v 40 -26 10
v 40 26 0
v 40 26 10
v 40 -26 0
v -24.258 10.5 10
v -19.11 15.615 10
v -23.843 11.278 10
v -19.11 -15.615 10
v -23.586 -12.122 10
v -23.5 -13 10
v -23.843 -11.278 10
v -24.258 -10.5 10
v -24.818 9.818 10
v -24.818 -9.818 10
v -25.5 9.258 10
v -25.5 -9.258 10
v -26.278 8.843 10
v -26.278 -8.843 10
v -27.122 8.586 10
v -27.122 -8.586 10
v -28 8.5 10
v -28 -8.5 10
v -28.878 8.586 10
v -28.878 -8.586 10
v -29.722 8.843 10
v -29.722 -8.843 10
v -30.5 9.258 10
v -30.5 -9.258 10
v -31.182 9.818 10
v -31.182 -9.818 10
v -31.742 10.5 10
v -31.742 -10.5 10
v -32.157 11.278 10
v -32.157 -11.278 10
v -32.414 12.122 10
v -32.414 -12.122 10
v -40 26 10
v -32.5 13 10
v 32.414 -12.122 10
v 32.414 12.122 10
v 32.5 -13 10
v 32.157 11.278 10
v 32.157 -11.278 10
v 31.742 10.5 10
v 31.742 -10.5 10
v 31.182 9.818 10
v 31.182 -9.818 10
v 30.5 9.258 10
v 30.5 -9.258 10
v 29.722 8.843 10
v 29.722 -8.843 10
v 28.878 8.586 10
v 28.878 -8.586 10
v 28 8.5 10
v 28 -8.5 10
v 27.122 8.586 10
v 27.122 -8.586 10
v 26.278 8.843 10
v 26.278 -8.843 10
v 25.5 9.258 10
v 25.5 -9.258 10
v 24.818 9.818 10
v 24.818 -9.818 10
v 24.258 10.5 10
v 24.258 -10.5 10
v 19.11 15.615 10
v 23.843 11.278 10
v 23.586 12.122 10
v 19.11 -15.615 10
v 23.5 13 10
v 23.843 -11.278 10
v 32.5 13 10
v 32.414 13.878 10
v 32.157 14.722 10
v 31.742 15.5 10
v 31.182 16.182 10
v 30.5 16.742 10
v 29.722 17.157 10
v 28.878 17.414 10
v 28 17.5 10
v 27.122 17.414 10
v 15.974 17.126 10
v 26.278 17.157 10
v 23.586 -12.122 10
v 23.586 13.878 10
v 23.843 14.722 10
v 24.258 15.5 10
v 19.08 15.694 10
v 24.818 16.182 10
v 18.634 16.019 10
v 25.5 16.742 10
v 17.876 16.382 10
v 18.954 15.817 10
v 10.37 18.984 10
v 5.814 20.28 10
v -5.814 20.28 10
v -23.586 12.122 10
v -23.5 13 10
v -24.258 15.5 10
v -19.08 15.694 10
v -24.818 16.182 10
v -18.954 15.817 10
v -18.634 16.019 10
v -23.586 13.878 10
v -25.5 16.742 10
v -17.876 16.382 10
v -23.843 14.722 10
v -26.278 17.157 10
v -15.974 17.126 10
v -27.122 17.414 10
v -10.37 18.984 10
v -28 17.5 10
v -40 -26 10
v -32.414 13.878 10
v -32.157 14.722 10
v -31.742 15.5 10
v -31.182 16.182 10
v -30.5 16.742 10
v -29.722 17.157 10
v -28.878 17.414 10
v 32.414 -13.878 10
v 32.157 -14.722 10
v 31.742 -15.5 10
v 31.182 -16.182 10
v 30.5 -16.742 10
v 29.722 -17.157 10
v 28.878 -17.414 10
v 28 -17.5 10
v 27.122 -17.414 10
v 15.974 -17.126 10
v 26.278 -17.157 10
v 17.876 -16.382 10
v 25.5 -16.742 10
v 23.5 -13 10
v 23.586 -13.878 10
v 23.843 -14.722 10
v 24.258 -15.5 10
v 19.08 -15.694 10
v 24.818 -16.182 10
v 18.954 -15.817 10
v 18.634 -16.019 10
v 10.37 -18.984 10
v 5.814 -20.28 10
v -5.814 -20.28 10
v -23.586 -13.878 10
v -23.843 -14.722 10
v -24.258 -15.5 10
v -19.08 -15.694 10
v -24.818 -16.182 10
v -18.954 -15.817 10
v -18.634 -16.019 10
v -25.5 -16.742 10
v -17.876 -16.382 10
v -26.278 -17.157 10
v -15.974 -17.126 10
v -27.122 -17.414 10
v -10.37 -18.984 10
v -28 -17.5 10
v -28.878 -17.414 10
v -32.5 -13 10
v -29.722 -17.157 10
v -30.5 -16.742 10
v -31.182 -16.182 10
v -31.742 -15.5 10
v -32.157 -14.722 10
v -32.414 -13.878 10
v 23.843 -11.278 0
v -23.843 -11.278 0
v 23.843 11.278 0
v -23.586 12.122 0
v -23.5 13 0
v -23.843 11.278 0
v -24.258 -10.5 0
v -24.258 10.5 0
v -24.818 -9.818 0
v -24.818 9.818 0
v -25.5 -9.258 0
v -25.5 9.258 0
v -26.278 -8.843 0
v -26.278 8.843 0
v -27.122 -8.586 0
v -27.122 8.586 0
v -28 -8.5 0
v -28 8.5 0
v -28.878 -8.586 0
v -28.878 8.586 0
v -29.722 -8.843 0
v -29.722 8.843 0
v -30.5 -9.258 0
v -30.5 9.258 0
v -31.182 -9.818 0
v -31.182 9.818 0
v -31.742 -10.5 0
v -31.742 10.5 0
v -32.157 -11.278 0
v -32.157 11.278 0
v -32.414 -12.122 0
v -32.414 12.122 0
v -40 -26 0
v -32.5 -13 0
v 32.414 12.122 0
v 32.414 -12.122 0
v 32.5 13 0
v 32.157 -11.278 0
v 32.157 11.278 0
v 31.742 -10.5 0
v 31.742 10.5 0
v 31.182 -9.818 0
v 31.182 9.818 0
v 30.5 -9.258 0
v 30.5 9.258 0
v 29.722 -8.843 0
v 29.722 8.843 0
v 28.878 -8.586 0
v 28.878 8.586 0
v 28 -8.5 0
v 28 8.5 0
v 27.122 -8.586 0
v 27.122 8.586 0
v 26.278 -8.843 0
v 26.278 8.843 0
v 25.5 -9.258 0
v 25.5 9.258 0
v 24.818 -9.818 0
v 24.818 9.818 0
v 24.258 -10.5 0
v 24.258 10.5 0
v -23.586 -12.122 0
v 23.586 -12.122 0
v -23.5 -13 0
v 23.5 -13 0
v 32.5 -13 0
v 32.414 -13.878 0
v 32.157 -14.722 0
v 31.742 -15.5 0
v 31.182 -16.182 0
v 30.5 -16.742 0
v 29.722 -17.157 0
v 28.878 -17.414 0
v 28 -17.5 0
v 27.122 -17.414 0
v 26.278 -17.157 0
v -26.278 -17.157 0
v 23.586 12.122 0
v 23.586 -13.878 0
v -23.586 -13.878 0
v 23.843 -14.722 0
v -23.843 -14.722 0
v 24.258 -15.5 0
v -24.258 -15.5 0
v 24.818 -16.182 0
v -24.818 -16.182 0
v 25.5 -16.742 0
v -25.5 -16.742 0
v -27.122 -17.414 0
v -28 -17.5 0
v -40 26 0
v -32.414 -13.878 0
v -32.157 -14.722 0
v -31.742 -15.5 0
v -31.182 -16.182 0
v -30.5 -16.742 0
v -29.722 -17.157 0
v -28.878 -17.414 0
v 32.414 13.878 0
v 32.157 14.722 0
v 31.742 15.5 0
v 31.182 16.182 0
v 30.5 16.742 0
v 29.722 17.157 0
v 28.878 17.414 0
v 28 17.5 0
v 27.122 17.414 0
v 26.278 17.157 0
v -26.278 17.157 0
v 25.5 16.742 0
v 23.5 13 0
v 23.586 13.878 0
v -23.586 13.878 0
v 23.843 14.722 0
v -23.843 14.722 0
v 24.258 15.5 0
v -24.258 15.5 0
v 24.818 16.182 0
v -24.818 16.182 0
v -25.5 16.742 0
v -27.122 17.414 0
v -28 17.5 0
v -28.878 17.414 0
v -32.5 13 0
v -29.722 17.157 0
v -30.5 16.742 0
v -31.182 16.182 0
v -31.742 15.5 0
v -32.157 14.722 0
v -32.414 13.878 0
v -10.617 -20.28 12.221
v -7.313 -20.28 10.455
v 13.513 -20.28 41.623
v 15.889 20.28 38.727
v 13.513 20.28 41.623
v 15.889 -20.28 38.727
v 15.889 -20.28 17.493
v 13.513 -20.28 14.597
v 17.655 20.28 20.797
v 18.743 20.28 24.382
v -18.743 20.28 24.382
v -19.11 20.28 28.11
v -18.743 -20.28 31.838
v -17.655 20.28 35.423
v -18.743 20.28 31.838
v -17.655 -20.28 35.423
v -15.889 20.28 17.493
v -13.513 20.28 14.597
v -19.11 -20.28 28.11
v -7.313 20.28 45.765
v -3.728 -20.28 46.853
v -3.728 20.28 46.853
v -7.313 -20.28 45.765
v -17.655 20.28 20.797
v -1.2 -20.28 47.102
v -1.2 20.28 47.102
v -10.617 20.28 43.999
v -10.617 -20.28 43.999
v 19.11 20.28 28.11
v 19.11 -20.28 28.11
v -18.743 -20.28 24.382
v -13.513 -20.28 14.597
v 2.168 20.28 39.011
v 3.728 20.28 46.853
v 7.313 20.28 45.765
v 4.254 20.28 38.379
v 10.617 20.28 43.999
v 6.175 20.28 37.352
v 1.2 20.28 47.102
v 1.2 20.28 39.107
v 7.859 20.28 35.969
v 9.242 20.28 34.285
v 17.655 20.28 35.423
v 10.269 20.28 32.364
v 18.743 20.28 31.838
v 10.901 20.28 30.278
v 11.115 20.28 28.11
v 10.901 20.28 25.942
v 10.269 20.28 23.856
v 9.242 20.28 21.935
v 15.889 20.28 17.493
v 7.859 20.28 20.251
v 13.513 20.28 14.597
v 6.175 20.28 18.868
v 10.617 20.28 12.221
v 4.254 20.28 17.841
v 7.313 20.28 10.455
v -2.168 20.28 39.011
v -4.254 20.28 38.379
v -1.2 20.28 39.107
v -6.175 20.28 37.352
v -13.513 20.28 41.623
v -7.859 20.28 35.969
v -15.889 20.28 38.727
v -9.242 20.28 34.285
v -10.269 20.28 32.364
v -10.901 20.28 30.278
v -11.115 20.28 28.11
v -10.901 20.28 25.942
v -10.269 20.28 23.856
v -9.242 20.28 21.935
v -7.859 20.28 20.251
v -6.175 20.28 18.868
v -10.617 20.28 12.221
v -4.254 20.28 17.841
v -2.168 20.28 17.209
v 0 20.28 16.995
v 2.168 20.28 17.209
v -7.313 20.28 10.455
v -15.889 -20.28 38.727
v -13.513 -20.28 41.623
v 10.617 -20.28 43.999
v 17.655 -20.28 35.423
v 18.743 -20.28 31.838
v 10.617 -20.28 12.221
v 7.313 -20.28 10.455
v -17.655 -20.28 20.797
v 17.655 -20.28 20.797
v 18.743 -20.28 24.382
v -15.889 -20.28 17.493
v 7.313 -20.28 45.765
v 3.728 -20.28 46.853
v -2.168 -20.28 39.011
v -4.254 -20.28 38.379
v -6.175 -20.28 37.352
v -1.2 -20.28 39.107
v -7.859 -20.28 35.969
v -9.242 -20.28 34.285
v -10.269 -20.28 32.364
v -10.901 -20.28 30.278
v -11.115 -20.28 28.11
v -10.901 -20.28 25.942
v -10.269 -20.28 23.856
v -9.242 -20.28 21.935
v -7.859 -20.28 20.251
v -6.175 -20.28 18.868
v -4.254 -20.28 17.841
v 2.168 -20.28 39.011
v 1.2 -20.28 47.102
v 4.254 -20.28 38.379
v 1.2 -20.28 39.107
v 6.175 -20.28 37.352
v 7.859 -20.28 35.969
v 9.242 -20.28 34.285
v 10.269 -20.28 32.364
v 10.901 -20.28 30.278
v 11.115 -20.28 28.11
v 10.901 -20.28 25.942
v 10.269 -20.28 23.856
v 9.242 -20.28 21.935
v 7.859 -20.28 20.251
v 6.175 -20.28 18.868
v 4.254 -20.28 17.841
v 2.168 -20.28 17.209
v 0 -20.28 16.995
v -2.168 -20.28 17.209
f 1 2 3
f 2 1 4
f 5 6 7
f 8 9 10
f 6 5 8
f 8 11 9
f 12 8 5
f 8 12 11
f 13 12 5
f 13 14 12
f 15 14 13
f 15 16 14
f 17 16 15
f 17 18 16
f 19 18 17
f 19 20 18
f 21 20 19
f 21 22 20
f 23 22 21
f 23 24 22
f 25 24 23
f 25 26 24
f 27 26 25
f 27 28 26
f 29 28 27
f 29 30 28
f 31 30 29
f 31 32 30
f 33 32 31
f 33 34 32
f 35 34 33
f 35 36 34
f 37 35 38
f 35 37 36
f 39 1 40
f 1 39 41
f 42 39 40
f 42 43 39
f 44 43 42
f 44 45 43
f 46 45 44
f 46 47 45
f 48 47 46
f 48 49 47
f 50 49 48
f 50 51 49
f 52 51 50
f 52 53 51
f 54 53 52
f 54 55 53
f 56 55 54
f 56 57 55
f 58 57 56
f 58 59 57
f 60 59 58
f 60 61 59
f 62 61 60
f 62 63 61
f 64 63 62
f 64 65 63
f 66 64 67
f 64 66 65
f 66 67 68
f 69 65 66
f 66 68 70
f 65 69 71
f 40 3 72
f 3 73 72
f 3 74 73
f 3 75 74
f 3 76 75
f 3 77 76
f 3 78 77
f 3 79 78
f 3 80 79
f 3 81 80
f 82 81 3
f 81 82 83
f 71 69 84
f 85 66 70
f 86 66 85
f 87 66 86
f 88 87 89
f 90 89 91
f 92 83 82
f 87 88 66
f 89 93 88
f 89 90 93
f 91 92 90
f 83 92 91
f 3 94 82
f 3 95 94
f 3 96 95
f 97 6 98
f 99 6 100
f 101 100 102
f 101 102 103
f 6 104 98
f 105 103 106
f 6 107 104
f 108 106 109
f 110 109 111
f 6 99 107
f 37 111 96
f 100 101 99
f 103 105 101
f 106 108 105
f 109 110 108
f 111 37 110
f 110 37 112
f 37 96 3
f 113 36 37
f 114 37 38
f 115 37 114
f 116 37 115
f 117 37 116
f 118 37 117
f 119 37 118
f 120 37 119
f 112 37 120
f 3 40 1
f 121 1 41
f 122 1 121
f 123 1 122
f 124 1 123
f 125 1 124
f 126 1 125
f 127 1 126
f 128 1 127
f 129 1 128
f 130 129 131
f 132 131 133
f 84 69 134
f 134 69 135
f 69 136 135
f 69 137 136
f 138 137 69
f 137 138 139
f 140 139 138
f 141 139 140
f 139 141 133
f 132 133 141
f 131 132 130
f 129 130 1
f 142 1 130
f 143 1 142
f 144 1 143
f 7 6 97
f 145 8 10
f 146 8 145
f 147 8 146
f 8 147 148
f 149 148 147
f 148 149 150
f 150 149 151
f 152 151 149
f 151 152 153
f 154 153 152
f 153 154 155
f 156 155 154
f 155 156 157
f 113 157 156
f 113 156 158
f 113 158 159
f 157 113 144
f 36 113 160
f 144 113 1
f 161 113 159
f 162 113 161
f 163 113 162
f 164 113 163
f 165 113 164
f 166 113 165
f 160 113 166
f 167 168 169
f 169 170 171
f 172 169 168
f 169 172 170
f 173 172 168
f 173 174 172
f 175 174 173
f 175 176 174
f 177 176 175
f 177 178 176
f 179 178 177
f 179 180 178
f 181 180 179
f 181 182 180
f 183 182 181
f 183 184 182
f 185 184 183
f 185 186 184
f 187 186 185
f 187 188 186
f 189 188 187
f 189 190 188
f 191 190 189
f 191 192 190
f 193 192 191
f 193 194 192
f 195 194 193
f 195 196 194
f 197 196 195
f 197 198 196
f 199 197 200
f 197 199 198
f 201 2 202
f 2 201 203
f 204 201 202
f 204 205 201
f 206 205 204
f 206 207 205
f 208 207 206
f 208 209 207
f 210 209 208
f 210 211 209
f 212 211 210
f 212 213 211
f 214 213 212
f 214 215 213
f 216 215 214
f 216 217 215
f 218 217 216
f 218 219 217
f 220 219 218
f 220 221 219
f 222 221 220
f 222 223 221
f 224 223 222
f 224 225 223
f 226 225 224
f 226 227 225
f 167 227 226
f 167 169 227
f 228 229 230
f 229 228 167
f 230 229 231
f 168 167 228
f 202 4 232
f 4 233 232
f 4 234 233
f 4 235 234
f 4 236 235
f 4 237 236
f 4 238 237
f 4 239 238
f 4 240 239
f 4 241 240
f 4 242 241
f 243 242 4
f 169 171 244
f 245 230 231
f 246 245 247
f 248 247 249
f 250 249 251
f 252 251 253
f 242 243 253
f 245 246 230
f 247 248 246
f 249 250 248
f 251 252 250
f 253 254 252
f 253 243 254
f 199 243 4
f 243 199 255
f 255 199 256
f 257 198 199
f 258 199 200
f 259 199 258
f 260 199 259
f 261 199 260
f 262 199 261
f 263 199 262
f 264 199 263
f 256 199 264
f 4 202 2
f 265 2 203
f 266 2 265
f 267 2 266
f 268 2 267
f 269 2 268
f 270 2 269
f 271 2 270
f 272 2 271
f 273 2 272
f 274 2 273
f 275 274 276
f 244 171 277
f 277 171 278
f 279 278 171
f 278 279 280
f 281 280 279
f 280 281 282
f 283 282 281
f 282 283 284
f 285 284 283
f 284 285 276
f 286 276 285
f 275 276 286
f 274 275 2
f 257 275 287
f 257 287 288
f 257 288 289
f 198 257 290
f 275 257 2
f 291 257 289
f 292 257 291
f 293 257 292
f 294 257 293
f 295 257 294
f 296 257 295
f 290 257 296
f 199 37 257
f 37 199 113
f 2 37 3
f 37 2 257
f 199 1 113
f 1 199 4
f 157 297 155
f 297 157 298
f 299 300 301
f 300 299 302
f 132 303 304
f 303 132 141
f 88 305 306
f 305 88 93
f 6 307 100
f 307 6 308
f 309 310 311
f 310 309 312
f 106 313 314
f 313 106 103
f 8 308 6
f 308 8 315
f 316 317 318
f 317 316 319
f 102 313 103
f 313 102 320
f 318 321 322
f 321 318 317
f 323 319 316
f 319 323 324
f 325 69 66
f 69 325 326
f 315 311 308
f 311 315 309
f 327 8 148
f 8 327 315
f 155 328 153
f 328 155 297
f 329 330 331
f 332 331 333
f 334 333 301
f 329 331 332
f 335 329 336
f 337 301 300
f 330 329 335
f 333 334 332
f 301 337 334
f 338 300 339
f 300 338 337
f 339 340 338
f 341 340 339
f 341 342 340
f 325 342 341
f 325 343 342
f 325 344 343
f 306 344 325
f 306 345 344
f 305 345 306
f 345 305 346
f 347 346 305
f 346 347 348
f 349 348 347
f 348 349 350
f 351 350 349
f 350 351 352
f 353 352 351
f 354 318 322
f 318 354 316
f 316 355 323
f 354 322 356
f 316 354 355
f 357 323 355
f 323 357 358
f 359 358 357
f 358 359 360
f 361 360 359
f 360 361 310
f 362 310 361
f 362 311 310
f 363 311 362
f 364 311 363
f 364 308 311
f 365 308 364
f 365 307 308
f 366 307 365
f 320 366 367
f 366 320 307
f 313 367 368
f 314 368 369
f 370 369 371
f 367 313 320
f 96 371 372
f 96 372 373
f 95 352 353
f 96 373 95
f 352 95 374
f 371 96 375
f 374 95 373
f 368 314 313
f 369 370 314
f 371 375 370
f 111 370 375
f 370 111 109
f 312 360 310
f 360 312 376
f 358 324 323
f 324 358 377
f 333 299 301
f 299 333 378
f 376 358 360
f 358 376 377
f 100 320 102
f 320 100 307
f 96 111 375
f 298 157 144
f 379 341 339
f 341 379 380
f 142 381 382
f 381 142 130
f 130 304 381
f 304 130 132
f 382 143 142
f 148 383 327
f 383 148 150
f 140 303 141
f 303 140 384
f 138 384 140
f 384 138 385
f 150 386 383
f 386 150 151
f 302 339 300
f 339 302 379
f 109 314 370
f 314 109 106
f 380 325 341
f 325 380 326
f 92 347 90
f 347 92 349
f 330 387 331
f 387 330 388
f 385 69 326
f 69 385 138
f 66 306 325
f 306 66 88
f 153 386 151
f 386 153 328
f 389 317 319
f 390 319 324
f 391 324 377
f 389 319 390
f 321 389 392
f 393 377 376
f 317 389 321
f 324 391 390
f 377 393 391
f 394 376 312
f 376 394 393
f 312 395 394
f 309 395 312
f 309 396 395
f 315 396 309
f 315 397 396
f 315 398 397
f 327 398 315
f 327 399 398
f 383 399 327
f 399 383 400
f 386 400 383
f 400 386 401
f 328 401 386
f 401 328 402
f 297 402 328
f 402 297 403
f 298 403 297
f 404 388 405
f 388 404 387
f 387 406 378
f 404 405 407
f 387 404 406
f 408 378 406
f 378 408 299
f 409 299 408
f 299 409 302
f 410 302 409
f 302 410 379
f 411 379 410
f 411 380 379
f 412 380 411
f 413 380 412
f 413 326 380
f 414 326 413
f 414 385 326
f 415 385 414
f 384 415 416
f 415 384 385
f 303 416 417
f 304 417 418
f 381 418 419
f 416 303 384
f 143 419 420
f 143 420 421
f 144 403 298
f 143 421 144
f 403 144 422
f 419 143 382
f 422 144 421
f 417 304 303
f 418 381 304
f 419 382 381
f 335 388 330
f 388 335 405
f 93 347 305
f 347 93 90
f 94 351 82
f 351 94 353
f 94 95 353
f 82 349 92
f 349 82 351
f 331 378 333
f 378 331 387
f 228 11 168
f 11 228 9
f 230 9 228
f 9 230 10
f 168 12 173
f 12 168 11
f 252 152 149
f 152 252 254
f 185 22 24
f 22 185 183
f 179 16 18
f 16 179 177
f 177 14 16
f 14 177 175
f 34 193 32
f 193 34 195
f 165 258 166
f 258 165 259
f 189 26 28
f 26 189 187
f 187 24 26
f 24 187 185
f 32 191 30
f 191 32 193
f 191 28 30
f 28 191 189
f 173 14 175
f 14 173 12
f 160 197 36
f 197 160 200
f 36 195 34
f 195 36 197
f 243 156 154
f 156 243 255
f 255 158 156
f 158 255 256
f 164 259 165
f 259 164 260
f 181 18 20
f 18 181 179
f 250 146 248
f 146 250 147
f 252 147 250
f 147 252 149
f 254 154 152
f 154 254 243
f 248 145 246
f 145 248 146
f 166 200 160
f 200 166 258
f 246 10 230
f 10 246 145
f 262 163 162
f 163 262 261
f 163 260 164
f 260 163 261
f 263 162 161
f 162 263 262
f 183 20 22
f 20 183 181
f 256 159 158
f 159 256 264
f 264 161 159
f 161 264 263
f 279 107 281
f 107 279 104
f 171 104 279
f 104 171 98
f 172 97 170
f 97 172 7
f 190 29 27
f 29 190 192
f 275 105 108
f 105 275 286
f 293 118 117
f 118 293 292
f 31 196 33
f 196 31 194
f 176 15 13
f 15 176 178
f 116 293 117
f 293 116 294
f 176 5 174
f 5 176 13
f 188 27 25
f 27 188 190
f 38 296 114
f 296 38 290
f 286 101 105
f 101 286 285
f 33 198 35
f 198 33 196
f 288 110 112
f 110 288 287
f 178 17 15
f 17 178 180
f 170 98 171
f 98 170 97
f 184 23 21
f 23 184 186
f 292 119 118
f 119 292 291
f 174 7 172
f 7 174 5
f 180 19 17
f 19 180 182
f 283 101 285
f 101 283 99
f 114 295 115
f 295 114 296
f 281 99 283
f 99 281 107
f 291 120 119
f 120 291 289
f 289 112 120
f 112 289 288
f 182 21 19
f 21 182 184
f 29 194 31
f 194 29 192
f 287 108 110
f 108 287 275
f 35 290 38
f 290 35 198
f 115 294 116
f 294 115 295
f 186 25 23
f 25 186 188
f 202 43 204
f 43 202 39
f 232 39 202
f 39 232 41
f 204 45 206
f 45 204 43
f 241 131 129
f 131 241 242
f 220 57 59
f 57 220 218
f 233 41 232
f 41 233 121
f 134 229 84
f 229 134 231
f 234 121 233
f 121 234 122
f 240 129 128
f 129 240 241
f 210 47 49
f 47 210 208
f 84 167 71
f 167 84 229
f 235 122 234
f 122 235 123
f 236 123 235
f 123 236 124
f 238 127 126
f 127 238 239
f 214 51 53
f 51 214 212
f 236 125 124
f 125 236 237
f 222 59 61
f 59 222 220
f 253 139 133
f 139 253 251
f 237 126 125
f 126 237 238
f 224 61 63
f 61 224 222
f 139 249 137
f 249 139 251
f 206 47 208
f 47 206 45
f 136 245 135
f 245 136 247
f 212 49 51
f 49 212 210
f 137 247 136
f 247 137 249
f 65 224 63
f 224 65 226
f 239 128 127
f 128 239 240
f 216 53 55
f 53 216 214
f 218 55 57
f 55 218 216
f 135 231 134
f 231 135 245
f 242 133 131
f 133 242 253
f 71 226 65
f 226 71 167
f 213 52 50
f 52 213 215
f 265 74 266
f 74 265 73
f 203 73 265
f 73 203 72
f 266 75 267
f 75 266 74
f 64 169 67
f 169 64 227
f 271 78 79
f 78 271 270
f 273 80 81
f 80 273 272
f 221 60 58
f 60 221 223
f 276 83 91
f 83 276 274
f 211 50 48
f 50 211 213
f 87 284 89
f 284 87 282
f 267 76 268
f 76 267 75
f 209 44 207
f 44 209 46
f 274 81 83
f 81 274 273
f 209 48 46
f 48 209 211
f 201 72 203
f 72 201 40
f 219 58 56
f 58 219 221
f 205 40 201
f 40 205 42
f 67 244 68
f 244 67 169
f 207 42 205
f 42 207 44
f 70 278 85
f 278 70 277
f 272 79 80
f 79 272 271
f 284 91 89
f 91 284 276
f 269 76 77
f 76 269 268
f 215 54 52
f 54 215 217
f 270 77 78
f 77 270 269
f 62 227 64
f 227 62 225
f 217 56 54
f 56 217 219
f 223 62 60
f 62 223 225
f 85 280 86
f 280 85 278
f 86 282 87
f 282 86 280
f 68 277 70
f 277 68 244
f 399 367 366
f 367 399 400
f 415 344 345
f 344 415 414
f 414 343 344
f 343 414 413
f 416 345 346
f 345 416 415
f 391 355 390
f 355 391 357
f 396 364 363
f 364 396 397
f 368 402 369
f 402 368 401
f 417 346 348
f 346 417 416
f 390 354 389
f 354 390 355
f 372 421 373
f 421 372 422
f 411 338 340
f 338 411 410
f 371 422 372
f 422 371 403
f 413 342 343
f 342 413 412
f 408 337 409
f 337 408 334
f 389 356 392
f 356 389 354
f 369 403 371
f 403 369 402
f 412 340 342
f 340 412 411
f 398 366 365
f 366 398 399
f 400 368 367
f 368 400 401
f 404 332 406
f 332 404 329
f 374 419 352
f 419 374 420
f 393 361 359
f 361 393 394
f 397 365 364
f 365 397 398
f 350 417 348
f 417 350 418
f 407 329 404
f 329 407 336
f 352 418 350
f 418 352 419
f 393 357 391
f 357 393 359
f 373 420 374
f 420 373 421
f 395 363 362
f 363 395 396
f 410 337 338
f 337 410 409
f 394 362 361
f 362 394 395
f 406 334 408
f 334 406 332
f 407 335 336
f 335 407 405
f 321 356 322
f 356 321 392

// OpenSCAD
$fn = 32;

// ----------------------------------------------------------------------
// Bearing block: 80 x 52 mm base, 22.23 mm bore at 28.11 mm
// ----------------------------------------------------------------------

// --- parameters (mm) ---
base_w = 80;              // base width
base_d = 52;              // base depth
base_t = 10;              // base thickness
bore_d = 22.23;           // shaft / bearing bore
house_r = 19.11;          // housing outer radius
house_len = 40.56;        // housing length along the shaft
foot_w = 38.22;           // foot width under the housing
foot_len = 30.56;         // foot length along the shaft
axis_z = 28.11;           // bore axis height above the base
holes_d = 9;              // mounting holes
hole_x = 28;              // mounting hole spacing
groove_w = 2.4;           // oil groove width

difference() {
  union() {
    /* base plate with its underside on z = 0 */
    translate([0, 0, base_t / 2]) cube([base_w, base_d, base_t], center = true);
    /* hull foot: a straight web blending into the round housing */
    hull() {
      translate([0, 0, base_t - 0.5]) cube([foot_w, foot_len, 1.6], center = true);
      translate([0, 0, axis_z]) rotate([-90, 0, 0]) cylinder(h = house_len, d = 2 * house_r, center = true);
    }
  }
  /* bore through the housing, 2.5 mm clear on both sides */
  translate([0, 0, axis_z]) rotate([-90, 0, 0]) cylinder(h = house_len + 5, d = bore_d, center = true);
  /* oil groove from the top of the housing into the bore */
  translate([-groove_w / 2, -house_len / 2 - 2.5, axis_z + bore_d * 0.17]) cube([groove_w, house_len + 5, house_r + 5]);
  /* mounting holes through the base plate */
  for (hx = [-28, 28]) {
    for (hy = [-13, 13]) {
      translate([hx, hy, -2.5]) cylinder(h = base_t + 5, d = holes_d);
    }
  }
}
